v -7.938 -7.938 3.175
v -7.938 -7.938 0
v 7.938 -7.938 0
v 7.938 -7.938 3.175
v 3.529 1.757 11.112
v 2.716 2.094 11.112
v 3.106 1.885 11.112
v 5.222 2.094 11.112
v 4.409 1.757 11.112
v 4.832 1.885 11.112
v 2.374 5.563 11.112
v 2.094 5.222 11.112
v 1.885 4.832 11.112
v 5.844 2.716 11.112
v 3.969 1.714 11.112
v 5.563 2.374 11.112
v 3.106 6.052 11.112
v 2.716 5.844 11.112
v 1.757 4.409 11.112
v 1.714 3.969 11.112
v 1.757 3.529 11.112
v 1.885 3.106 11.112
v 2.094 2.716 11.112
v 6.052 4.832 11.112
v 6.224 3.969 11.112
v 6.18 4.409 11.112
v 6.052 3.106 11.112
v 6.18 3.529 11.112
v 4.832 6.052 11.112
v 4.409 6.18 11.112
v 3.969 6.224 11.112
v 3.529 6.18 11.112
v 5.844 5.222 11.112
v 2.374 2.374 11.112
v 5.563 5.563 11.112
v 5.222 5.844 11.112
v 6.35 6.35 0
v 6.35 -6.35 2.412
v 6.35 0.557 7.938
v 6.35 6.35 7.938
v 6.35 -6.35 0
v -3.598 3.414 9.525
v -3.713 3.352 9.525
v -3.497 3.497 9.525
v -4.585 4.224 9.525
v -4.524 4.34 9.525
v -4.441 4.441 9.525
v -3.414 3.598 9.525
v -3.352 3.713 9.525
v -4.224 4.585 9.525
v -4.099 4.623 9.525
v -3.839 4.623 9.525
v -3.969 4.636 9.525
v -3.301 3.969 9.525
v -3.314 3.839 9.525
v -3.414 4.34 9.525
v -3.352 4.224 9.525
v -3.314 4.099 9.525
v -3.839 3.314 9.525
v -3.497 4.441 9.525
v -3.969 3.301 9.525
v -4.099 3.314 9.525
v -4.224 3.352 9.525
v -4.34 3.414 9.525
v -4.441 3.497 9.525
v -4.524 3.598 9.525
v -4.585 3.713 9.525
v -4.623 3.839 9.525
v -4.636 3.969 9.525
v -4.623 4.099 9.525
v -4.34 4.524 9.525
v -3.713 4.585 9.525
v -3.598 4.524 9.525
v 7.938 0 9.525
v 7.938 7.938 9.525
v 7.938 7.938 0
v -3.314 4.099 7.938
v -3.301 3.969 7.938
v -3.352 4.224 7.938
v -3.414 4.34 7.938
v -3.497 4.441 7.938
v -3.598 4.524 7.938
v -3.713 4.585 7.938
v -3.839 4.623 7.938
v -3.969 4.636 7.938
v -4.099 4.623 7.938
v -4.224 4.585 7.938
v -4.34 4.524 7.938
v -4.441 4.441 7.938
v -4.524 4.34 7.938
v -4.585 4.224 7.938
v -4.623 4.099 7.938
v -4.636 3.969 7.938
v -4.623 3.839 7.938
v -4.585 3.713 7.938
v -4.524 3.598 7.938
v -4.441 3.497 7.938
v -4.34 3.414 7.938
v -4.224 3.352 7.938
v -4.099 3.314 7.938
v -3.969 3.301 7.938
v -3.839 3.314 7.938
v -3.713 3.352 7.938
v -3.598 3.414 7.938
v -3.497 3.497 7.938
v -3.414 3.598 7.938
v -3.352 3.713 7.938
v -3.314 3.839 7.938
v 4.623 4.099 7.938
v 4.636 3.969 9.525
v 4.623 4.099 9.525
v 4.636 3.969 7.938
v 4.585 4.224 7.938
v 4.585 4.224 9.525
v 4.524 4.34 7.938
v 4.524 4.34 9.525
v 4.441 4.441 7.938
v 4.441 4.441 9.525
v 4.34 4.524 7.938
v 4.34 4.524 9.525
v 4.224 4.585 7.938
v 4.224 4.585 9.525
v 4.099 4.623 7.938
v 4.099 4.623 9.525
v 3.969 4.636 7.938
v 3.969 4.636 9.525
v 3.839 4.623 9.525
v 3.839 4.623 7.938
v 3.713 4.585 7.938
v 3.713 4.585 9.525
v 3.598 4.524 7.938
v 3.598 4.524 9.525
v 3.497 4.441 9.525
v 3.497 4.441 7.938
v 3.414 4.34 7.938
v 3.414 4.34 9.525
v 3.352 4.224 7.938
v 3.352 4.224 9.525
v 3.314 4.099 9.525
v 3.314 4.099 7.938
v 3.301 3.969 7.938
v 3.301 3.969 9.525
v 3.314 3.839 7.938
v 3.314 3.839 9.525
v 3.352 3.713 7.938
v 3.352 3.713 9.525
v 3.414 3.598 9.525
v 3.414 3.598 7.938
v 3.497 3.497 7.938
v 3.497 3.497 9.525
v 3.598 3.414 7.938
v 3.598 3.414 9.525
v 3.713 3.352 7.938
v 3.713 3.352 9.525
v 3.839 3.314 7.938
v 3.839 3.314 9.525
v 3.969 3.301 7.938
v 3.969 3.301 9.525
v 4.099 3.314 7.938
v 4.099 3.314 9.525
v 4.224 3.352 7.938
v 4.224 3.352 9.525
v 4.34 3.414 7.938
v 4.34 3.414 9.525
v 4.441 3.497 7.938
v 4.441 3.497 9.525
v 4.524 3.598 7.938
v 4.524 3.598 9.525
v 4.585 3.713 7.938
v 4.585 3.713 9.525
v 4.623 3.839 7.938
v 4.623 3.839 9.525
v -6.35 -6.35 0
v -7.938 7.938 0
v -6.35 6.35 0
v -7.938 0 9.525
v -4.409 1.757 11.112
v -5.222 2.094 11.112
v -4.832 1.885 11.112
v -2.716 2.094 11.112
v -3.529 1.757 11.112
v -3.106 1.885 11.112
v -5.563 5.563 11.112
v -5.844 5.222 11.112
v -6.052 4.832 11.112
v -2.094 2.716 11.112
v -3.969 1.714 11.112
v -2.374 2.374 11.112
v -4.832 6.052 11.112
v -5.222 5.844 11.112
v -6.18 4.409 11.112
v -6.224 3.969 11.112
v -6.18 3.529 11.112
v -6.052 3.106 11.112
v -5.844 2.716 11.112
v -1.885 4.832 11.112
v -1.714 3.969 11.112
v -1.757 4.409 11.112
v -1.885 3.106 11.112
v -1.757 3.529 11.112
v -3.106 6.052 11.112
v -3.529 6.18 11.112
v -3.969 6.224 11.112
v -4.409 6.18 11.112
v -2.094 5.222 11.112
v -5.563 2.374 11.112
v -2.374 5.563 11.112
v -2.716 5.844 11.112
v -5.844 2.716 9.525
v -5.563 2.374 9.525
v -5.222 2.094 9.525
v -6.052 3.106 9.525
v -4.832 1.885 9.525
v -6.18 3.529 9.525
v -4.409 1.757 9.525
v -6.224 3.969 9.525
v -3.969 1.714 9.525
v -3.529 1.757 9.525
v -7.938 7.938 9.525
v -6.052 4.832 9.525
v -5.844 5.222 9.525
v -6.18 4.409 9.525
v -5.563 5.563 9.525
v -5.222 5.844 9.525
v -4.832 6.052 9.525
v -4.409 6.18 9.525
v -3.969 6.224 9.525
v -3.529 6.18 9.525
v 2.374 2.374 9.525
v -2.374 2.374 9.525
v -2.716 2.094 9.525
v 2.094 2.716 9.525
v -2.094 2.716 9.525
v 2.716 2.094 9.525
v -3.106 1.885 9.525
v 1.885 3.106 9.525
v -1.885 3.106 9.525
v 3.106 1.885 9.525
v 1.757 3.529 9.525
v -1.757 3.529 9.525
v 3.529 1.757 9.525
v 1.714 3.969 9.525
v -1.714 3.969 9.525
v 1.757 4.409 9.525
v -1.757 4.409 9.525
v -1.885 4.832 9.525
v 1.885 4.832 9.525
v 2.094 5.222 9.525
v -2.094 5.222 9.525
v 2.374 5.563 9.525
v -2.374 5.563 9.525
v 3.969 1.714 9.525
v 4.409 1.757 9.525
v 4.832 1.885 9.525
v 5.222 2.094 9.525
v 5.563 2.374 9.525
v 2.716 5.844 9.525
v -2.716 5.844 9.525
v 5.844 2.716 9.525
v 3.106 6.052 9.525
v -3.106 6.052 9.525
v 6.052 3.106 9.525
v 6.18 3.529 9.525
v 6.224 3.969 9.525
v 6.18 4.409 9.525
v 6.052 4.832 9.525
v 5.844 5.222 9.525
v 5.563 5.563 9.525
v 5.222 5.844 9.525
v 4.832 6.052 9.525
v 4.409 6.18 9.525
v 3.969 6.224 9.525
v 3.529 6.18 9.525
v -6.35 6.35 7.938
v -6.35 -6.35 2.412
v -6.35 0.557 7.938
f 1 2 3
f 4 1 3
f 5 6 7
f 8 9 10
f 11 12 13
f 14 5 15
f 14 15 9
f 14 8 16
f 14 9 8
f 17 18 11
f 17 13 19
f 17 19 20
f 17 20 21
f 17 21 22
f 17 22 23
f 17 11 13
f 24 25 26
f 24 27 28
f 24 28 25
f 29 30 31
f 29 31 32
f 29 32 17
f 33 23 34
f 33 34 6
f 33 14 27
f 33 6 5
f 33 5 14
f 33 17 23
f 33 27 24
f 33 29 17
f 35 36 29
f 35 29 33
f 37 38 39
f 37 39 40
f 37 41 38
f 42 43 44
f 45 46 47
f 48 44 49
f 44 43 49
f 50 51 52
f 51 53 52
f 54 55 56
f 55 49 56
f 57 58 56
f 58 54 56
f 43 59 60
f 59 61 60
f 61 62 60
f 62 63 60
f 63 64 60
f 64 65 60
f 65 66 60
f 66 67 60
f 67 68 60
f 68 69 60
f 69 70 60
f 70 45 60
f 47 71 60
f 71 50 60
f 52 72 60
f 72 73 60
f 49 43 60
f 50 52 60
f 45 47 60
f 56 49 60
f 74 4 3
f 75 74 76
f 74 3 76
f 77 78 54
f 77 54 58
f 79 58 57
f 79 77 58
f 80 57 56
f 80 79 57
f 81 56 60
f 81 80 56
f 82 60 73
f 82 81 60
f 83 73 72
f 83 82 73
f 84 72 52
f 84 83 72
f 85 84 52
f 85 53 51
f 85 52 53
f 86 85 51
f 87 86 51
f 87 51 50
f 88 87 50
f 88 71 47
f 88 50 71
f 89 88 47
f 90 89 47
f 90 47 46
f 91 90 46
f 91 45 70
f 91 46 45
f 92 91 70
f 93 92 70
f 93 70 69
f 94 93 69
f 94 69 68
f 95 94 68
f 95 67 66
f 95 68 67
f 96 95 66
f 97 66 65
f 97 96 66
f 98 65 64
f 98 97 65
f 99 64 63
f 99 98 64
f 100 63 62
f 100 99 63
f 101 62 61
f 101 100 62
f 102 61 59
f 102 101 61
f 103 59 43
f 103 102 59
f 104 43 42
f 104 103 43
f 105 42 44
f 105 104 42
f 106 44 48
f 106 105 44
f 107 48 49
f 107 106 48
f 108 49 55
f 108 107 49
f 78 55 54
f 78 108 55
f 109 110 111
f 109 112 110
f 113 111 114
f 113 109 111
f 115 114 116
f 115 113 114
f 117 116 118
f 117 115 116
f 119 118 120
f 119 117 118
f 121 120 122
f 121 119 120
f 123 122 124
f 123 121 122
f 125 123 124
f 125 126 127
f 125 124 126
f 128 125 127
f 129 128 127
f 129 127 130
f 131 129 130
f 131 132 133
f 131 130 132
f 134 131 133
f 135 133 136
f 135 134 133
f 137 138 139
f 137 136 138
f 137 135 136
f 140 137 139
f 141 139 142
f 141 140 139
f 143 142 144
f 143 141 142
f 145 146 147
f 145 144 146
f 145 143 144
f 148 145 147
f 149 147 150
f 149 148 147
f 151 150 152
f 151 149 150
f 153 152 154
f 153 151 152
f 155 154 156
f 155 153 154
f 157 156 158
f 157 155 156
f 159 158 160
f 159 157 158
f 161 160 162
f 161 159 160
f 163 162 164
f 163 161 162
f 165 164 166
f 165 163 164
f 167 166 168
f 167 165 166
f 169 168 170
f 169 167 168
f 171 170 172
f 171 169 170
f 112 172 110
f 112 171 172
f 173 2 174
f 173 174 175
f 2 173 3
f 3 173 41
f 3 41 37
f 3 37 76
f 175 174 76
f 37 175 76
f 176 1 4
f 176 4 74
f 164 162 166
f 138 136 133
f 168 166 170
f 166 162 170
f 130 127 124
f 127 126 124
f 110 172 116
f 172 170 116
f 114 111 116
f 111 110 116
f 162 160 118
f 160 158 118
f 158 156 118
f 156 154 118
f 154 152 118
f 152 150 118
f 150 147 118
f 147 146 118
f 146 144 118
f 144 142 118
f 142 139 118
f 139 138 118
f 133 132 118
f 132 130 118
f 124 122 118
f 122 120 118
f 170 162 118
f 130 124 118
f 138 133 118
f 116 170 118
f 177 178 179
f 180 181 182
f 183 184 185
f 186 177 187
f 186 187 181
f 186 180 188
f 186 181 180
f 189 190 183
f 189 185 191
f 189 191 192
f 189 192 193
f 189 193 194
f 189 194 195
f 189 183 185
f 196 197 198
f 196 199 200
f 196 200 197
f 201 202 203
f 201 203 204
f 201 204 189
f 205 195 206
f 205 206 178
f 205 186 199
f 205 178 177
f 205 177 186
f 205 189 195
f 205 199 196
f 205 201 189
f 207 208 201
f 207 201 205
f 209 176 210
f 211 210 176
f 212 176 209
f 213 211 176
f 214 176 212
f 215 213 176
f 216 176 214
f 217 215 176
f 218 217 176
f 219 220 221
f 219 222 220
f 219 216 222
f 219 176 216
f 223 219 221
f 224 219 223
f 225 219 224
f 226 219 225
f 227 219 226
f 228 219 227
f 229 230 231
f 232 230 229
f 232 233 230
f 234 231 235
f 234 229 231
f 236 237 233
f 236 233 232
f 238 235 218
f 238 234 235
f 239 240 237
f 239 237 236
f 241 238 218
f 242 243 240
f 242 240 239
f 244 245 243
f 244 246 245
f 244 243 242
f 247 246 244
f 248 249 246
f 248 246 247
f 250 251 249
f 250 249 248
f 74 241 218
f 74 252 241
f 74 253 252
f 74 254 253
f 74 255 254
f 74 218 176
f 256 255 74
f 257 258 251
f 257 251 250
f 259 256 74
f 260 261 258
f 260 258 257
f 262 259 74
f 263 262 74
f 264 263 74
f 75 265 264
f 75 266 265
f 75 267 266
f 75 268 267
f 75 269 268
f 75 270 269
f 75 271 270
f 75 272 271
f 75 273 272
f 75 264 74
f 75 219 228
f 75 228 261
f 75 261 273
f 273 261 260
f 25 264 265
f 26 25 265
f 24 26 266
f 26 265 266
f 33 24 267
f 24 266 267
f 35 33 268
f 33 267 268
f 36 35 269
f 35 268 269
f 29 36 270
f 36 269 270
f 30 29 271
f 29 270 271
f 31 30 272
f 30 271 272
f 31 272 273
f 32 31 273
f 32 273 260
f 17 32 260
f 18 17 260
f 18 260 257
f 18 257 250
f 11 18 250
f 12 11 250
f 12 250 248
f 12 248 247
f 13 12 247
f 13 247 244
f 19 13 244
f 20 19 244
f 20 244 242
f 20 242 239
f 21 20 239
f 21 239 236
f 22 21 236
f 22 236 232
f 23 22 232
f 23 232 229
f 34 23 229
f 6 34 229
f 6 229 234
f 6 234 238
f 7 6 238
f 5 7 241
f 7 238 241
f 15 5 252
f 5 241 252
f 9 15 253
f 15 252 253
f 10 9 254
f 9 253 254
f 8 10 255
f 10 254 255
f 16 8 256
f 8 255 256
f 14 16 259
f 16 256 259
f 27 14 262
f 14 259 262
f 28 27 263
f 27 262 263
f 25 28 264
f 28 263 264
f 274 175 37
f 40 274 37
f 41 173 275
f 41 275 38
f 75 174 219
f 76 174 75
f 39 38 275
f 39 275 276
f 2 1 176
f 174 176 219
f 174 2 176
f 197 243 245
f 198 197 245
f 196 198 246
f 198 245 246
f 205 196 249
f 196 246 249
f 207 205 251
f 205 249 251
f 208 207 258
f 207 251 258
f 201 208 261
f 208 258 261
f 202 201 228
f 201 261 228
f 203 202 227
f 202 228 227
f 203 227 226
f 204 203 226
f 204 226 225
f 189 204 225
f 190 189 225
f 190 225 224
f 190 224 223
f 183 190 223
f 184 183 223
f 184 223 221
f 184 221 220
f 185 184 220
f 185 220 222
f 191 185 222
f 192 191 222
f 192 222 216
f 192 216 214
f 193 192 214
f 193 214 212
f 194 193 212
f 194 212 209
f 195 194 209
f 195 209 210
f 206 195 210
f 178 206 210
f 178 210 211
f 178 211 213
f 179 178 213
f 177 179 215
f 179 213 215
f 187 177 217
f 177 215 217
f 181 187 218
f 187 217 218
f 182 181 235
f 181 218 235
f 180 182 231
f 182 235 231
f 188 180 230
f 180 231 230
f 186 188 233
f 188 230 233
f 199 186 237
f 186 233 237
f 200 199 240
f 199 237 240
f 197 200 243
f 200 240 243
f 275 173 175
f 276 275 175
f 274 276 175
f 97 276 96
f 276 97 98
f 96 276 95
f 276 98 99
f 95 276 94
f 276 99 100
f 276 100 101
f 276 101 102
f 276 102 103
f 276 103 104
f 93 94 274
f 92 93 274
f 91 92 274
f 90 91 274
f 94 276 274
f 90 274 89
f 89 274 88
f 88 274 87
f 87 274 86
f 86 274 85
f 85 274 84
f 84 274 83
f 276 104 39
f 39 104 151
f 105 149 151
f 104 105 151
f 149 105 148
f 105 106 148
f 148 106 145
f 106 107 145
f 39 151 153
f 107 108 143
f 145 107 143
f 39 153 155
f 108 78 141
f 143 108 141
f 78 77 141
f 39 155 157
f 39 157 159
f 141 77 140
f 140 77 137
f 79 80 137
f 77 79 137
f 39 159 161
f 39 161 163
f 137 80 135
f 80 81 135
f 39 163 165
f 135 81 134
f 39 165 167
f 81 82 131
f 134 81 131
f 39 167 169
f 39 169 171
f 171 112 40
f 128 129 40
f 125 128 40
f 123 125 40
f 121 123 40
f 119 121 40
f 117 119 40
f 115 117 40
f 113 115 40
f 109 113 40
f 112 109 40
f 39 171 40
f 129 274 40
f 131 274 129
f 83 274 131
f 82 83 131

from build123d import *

# Parameters (mm, degrees)
F0_W     = 15.875
F0_H     = 15.875
F0_R     = 2.2550277878
F0_R_2   = 3.175
F0_R_3   = 2.38125
F1_DEPTH = 9.525
F2_DEPTH = 11.1125
F3_DEPTH = 9.525
F5_DEPTH = 25.4
F6_T     = -1.5875


with BuildPart() as f1:
    # F0 (on Top) → F1 (new body)
    with BuildSketch(Plane.XY):
        Rectangle(F0_W, F0_H)
        with Locations((-3.96875, 3.96875)):
            Circle(F0_R, mode=Mode.SUBTRACT)
        Circle(F0_R_2, mode=Mode.SUBTRACT)
        with Locations((3.96875, 3.96875)):
            Circle(F0_R, mode=Mode.SUBTRACT)
        Circle(F0_R_2)
        Circle(F0_R_3, mode=Mode.SUBTRACT)
        Circle(F0_R_3)
    extrude(amount=F1_DEPTH)

    # F0 (on Top) → F2 (join)
    with BuildSketch(Plane.XY):
        with Locations((-3.96875, 3.96875)):
            Circle(F0_R)
        with Locations((3.96875, 3.96875)):
            Circle(F0_R)
    extrude(amount=F2_DEPTH)

    # F0 (on Top) → F3 (join)
    with BuildSketch(Plane.XY):
        Circle(F0_R_2)
        Circle(F0_R_3, mode=Mode.SUBTRACT)
    extrude(amount=F3_DEPTH)

    # F4 (on face) → F5 (cut)
    with BuildSketch(Plane.YZ.offset(7.9375)):
        Polygon((-7.9375, 9.525), (-7.9375, 3.175), (0, 9.525), align=None)
    extrude(amount=-F5_DEPTH, mode=Mode.SUBTRACT)

    # F6
    f6_openings = [f1.faces().sort_by_distance(p)[0] for p in [
        (0, 0, 0),
    ]]
    offset(amount=F6_T, openings=f6_openings, kind=Kind.INTERSECTION)


solid = f1.part
